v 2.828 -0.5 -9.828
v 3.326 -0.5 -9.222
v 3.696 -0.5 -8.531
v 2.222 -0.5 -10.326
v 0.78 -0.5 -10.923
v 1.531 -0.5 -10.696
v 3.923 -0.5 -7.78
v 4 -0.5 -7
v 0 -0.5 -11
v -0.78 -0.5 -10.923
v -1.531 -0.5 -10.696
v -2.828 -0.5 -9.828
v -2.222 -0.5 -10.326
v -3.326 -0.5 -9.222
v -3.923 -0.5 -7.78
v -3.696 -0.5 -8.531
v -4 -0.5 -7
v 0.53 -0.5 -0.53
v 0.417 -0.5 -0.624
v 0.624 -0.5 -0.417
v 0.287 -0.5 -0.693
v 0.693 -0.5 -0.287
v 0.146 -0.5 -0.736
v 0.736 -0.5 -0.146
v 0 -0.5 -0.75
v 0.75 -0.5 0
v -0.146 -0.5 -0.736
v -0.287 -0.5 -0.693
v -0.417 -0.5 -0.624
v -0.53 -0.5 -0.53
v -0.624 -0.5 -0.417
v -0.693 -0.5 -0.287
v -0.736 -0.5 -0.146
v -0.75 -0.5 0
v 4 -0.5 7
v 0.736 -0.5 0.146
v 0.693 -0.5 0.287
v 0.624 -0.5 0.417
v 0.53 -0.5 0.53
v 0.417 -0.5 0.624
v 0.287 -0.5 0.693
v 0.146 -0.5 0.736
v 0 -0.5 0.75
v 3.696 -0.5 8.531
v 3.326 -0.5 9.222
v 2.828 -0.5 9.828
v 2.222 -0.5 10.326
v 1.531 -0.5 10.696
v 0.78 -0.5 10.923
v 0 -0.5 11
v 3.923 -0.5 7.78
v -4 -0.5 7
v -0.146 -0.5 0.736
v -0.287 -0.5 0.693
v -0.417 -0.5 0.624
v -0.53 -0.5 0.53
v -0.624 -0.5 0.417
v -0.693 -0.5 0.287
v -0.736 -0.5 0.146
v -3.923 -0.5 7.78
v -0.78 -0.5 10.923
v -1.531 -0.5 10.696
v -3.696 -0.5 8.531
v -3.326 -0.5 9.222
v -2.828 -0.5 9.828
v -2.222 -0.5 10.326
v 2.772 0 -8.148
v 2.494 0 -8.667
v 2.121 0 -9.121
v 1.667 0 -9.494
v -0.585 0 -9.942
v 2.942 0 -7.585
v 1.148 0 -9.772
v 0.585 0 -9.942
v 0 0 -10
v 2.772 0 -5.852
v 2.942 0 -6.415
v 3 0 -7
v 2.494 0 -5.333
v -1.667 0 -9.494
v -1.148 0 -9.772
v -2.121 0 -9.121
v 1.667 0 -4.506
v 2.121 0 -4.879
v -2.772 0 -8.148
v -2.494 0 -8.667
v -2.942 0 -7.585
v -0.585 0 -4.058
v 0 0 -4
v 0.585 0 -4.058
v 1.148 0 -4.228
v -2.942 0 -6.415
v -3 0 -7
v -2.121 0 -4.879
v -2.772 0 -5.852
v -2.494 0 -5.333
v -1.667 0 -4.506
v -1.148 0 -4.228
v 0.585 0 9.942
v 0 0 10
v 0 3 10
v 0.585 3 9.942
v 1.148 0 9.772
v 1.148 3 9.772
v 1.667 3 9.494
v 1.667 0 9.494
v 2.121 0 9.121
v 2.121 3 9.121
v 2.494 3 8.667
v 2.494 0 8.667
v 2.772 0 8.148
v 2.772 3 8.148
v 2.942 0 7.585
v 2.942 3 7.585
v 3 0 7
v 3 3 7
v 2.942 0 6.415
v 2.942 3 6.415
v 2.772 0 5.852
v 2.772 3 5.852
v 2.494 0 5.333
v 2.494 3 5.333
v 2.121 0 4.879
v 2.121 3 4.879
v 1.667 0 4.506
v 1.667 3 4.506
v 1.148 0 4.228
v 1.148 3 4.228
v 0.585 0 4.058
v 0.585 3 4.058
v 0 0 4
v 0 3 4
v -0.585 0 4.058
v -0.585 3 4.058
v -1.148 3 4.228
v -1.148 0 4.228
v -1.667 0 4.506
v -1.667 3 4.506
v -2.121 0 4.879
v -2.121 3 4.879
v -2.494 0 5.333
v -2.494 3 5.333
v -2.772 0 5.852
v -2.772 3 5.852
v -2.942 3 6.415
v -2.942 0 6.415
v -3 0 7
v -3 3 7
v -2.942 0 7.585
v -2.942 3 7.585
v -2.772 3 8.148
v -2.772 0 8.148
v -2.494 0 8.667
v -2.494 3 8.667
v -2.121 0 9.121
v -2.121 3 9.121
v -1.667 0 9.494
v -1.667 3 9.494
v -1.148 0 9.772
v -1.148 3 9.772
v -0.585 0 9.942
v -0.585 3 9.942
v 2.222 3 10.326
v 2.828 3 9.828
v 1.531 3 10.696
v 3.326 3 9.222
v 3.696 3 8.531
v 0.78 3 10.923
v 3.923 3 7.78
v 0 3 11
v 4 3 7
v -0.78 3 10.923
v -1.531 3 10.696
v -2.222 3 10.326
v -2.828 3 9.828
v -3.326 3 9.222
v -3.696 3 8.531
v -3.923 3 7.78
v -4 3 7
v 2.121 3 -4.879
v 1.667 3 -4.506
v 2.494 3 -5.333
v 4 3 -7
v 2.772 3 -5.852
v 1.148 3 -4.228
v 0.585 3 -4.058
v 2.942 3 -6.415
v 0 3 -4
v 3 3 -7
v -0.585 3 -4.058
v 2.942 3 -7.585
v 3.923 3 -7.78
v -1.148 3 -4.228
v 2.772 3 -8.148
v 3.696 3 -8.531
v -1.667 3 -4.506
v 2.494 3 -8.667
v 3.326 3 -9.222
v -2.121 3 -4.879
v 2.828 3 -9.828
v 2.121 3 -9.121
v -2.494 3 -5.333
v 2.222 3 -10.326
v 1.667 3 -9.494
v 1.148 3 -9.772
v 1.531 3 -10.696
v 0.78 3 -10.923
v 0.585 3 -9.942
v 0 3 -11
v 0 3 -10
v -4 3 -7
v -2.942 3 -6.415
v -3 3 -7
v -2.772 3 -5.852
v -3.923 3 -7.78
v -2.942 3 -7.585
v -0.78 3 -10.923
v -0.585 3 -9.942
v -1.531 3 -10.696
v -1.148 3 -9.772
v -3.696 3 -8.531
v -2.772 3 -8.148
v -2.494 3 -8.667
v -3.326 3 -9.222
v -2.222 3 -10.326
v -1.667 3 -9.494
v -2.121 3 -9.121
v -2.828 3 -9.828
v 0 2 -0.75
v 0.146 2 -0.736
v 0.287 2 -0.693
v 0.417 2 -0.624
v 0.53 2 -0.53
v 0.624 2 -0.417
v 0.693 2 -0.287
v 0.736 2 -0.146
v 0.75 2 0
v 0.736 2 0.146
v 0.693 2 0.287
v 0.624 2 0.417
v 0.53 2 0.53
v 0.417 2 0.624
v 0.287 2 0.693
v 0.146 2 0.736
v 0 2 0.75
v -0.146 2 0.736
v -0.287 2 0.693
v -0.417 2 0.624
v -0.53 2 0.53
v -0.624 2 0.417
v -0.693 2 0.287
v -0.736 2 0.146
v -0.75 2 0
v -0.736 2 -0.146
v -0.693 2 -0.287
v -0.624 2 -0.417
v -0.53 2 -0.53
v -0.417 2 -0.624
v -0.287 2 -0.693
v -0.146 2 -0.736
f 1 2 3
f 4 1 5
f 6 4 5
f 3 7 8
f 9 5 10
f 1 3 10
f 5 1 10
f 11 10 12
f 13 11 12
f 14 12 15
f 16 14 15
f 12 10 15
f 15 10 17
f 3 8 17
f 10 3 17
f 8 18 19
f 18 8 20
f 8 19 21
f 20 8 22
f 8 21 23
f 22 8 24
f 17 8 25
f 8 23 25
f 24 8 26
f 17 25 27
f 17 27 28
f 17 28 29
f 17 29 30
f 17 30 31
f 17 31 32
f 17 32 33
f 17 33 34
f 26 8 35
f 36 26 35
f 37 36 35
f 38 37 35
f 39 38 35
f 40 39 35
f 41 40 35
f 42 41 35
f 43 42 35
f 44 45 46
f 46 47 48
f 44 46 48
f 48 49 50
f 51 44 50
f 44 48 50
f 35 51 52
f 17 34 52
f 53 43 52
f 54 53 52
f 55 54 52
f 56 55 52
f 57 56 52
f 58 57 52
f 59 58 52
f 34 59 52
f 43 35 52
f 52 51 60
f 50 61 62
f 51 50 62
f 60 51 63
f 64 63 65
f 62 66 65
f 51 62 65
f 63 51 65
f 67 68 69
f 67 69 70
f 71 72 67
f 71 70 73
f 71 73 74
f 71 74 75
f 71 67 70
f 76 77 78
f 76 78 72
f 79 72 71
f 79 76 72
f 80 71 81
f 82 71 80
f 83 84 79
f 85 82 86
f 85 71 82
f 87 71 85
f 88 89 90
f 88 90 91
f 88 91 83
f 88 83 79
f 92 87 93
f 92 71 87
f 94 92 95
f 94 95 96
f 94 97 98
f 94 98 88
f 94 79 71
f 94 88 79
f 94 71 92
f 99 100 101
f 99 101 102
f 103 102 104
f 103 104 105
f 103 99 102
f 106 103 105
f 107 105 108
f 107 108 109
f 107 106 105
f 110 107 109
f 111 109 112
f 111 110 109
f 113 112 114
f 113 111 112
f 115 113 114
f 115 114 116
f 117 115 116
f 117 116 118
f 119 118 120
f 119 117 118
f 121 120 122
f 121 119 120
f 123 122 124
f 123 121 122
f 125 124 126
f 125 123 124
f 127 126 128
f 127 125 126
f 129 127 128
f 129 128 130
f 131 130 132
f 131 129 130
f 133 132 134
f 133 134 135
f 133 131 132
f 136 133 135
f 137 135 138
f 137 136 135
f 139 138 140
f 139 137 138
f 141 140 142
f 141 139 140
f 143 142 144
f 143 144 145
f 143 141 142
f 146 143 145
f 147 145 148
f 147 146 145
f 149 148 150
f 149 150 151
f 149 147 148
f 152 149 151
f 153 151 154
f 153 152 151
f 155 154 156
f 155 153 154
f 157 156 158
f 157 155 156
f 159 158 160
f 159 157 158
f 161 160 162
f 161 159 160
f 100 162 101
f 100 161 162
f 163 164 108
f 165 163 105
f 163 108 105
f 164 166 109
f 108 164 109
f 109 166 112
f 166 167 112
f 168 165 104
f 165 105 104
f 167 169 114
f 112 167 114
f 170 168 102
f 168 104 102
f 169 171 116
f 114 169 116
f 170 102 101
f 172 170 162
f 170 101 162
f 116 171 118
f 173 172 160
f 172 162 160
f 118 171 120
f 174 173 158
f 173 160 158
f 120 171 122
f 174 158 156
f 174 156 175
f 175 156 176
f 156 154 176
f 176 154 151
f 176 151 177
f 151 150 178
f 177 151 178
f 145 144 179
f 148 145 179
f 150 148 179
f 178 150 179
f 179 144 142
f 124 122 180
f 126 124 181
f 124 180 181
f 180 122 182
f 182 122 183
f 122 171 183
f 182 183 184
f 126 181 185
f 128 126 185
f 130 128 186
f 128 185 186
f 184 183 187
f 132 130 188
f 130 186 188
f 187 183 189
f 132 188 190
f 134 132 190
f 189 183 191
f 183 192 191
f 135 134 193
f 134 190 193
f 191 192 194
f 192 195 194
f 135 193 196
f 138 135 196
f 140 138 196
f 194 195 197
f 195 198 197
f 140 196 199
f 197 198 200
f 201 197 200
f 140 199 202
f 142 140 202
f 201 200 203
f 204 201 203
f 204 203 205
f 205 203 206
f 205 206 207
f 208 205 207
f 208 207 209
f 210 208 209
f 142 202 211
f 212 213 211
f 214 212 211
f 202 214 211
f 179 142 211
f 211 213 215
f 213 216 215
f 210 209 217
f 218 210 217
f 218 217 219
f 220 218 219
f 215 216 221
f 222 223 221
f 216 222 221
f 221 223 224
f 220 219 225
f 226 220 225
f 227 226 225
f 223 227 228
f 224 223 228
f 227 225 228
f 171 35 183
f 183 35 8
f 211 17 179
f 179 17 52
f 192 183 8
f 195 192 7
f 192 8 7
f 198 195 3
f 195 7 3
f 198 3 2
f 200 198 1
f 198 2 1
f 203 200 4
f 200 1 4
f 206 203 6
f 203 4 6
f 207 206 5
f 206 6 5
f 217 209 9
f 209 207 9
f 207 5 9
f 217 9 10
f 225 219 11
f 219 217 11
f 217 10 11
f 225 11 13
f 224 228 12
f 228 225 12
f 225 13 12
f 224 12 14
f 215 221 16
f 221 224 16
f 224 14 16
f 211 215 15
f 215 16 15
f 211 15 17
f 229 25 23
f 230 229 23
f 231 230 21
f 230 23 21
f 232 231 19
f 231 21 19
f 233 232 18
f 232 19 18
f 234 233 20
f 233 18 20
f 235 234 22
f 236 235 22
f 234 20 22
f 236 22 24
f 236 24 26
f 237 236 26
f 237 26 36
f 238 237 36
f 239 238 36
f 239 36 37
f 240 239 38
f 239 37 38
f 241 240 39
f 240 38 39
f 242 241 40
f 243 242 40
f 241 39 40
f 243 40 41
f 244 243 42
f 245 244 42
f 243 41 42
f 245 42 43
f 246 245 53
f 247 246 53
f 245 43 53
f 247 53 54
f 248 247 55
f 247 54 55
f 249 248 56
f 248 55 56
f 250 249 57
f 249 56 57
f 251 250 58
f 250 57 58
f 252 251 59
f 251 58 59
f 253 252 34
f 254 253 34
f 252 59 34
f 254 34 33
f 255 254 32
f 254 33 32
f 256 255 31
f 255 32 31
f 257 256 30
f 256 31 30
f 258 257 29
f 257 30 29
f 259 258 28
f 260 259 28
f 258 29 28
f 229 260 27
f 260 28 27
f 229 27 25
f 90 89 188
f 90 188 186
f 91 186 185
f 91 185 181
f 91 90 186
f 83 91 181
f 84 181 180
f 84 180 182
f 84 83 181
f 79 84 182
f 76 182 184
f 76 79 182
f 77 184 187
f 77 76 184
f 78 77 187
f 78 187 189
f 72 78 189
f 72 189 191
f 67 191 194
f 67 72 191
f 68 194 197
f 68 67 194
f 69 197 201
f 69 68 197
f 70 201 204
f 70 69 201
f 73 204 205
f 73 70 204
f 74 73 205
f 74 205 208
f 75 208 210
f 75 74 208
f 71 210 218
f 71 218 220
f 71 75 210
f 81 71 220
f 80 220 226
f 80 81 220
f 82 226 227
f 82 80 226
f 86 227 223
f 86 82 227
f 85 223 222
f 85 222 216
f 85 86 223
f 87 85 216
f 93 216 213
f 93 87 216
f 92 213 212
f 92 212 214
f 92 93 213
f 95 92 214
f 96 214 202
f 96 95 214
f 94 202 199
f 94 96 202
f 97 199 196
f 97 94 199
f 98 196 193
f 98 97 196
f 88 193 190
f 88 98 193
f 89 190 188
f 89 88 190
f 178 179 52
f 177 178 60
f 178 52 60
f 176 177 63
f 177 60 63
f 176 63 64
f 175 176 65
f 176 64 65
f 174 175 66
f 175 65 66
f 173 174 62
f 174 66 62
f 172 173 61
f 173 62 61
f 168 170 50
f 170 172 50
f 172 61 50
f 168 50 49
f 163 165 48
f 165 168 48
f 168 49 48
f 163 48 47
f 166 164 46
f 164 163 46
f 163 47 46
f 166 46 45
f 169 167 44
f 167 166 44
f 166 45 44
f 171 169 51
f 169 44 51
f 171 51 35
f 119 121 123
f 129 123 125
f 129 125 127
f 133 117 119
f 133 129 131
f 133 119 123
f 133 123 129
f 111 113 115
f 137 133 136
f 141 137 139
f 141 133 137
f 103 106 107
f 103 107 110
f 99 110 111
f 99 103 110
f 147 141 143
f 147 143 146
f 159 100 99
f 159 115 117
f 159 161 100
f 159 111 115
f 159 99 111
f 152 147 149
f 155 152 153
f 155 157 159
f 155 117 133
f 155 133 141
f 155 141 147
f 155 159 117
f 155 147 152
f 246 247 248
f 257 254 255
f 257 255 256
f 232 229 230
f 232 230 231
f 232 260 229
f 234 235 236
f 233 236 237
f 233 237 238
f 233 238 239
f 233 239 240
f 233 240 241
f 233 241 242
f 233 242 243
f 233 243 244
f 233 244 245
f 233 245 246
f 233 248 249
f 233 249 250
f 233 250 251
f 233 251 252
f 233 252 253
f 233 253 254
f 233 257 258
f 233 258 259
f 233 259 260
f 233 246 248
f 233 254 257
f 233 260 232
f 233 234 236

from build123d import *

# Parameters (mm, degrees)
SKETCH1_R           = 3
BOSS_EXTRUDE1_DEPTH = 3
BOSS_EXTRUDE2_START = 0.5
BOSS_EXTRUDE2_DEPTH = 0.5
SKETCH3_R           = 0.75
CUT_EXTRUDE1_DEPTH  = 2.5


with BuildPart() as part:
    # Sketch1 → Boss-Extrude1 (new body)
    with BuildSketch(Plane(origin=(0, 0, 0), x_dir=(1, 0, 0), z_dir=(0, 1, 0))):
        with BuildLine():
            Line((4, 7), (4, -7))
            ThreePointArc((4, -7), (0, -11), (-4, -7))
            Line((-4, -7), (-4, 7))
            ThreePointArc((-4, 7), (0, 11), (4, 7))
        make_face()
        with Locations(Location((0, 7, 0), (0, 0, 270))):
            Circle(SKETCH1_R, mode=Mode.SUBTRACT)
        with Locations(Location((0, -7, 0), (0, 0, 270))):
            Circle(SKETCH1_R, mode=Mode.SUBTRACT)
    extrude(amount=BOSS_EXTRUDE1_DEPTH)

    # Sketch2 → Boss-Extrude2 (add)
    with BuildSketch(Plane.XZ.offset(BOSS_EXTRUDE2_START)):
        with BuildLine():
            Line((4, 7), (4, -7))
            ThreePointArc((4, -7), (0, -11), (-4, -7))
            Line((-4, -7), (-4, 7))
            ThreePointArc((-4, 7), (0, 11), (4, 7))
        make_face()
    extrude(amount=-BOSS_EXTRUDE2_DEPTH)

    # Sketch3 → Cut-Extrude1 (cut)
    with BuildSketch(Plane.XZ.offset(0.5)):
        with Locations(Location((0, 0, 0), (0, 0, 270))):
            Circle(SKETCH3_R)
    extrude(amount=-CUT_EXTRUDE1_DEPTH, mode=Mode.SUBTRACT)


solid = part.part
